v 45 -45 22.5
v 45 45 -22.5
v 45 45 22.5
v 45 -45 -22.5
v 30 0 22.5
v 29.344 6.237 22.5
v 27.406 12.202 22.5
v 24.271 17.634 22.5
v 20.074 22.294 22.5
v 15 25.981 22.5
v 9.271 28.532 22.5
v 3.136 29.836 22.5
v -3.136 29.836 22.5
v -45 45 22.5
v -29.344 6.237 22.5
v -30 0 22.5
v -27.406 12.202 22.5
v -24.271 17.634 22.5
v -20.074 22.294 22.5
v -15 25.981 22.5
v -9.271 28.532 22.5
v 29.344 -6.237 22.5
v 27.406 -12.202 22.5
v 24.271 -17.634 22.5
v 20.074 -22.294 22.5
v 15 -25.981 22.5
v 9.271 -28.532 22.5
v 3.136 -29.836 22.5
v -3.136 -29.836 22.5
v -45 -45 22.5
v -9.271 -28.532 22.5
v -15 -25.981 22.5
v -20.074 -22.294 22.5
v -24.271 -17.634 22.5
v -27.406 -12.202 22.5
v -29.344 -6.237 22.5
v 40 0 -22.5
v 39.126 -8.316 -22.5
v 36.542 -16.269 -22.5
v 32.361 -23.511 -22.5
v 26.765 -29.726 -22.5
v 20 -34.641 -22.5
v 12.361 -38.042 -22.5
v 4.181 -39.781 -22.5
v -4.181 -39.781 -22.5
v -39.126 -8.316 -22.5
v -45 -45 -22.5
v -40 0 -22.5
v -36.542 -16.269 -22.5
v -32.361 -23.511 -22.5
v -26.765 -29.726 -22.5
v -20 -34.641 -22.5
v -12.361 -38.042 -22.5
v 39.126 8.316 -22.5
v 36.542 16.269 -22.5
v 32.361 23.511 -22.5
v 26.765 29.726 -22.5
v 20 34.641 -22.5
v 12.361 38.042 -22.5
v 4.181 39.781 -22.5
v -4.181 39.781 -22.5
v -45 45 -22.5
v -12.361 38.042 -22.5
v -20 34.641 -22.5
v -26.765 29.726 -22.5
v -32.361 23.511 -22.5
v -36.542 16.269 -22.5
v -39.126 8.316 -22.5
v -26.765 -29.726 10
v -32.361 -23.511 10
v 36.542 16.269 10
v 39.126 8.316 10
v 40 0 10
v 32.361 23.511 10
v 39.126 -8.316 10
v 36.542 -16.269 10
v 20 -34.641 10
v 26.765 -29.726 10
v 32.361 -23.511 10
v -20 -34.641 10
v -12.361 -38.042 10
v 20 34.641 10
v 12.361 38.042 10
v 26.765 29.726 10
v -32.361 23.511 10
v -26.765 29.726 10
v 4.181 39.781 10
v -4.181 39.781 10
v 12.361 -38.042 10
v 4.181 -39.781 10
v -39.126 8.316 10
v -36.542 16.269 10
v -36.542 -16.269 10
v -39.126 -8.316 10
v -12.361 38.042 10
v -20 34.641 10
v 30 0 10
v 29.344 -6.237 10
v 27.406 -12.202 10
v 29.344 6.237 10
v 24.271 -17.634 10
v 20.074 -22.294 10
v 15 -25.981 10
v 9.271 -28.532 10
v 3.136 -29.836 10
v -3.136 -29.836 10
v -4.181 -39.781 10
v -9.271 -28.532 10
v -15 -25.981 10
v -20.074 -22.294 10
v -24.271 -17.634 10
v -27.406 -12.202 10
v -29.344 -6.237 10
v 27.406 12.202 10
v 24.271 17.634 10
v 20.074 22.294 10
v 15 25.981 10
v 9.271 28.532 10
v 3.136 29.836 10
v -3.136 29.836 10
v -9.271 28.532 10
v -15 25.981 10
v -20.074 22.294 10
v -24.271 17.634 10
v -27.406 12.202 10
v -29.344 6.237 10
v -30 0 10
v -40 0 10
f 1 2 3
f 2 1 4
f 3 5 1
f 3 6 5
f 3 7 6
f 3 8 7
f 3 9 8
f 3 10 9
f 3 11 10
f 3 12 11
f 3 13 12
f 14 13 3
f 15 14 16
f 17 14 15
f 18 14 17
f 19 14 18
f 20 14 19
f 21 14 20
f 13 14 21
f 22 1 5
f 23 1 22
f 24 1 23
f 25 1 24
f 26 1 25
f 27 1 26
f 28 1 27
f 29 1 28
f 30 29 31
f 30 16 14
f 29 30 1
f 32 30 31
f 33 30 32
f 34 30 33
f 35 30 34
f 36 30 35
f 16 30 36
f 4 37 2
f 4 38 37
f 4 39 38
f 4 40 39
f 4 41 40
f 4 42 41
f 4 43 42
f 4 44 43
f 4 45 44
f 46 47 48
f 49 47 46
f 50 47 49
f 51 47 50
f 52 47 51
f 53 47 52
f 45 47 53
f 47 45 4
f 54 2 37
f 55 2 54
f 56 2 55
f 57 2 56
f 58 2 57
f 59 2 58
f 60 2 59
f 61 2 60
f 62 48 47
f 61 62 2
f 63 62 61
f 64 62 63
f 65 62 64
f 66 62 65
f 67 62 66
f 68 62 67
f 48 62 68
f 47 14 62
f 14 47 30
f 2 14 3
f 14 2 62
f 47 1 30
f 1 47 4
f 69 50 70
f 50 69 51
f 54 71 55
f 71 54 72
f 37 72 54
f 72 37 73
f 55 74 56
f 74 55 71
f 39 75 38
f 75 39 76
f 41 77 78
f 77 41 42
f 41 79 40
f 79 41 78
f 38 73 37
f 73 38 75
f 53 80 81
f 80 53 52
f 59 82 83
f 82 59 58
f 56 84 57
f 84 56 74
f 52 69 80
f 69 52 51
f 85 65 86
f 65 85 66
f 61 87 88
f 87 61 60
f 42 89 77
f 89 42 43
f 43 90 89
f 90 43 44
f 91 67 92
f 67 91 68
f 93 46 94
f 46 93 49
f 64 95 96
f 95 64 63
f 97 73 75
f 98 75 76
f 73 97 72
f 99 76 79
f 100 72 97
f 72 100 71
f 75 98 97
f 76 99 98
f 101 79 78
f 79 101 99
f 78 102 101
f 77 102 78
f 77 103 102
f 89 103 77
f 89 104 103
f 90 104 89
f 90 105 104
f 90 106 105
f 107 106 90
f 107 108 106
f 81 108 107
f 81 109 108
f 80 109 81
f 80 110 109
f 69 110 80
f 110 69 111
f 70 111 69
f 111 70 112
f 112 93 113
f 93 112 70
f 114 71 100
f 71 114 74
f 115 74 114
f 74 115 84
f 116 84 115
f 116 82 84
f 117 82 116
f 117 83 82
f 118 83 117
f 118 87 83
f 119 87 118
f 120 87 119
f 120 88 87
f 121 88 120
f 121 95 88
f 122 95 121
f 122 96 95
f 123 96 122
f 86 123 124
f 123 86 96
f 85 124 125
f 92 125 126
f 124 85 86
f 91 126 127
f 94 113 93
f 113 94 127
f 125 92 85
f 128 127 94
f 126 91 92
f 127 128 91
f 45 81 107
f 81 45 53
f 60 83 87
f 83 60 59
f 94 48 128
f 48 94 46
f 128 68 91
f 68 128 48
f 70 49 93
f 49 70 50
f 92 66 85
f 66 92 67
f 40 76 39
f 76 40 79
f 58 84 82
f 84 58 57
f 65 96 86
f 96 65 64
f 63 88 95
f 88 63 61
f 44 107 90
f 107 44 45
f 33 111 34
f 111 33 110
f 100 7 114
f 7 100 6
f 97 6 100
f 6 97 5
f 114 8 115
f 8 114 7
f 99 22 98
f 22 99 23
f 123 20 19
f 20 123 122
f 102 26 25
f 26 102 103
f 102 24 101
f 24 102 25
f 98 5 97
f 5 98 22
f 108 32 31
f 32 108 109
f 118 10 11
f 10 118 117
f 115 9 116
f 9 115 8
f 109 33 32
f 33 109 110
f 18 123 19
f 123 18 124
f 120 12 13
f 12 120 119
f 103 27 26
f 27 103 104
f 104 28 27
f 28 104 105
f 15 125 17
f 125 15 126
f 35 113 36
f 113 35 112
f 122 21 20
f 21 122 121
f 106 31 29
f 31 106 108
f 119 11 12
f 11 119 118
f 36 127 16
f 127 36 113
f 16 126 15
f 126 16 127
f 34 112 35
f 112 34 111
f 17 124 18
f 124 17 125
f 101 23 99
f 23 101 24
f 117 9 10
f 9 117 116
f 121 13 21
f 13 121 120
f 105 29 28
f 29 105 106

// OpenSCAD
C1 = 40;
C2 = 30;
B = 90;


difference(){

	cube([B,B,B-(B/2)], center = true);
translate([0, 0, -30])
	cylinder(40,C1,C1);
translate([0, 0, -20])
	cylinder(60,C2,C2);

	}
